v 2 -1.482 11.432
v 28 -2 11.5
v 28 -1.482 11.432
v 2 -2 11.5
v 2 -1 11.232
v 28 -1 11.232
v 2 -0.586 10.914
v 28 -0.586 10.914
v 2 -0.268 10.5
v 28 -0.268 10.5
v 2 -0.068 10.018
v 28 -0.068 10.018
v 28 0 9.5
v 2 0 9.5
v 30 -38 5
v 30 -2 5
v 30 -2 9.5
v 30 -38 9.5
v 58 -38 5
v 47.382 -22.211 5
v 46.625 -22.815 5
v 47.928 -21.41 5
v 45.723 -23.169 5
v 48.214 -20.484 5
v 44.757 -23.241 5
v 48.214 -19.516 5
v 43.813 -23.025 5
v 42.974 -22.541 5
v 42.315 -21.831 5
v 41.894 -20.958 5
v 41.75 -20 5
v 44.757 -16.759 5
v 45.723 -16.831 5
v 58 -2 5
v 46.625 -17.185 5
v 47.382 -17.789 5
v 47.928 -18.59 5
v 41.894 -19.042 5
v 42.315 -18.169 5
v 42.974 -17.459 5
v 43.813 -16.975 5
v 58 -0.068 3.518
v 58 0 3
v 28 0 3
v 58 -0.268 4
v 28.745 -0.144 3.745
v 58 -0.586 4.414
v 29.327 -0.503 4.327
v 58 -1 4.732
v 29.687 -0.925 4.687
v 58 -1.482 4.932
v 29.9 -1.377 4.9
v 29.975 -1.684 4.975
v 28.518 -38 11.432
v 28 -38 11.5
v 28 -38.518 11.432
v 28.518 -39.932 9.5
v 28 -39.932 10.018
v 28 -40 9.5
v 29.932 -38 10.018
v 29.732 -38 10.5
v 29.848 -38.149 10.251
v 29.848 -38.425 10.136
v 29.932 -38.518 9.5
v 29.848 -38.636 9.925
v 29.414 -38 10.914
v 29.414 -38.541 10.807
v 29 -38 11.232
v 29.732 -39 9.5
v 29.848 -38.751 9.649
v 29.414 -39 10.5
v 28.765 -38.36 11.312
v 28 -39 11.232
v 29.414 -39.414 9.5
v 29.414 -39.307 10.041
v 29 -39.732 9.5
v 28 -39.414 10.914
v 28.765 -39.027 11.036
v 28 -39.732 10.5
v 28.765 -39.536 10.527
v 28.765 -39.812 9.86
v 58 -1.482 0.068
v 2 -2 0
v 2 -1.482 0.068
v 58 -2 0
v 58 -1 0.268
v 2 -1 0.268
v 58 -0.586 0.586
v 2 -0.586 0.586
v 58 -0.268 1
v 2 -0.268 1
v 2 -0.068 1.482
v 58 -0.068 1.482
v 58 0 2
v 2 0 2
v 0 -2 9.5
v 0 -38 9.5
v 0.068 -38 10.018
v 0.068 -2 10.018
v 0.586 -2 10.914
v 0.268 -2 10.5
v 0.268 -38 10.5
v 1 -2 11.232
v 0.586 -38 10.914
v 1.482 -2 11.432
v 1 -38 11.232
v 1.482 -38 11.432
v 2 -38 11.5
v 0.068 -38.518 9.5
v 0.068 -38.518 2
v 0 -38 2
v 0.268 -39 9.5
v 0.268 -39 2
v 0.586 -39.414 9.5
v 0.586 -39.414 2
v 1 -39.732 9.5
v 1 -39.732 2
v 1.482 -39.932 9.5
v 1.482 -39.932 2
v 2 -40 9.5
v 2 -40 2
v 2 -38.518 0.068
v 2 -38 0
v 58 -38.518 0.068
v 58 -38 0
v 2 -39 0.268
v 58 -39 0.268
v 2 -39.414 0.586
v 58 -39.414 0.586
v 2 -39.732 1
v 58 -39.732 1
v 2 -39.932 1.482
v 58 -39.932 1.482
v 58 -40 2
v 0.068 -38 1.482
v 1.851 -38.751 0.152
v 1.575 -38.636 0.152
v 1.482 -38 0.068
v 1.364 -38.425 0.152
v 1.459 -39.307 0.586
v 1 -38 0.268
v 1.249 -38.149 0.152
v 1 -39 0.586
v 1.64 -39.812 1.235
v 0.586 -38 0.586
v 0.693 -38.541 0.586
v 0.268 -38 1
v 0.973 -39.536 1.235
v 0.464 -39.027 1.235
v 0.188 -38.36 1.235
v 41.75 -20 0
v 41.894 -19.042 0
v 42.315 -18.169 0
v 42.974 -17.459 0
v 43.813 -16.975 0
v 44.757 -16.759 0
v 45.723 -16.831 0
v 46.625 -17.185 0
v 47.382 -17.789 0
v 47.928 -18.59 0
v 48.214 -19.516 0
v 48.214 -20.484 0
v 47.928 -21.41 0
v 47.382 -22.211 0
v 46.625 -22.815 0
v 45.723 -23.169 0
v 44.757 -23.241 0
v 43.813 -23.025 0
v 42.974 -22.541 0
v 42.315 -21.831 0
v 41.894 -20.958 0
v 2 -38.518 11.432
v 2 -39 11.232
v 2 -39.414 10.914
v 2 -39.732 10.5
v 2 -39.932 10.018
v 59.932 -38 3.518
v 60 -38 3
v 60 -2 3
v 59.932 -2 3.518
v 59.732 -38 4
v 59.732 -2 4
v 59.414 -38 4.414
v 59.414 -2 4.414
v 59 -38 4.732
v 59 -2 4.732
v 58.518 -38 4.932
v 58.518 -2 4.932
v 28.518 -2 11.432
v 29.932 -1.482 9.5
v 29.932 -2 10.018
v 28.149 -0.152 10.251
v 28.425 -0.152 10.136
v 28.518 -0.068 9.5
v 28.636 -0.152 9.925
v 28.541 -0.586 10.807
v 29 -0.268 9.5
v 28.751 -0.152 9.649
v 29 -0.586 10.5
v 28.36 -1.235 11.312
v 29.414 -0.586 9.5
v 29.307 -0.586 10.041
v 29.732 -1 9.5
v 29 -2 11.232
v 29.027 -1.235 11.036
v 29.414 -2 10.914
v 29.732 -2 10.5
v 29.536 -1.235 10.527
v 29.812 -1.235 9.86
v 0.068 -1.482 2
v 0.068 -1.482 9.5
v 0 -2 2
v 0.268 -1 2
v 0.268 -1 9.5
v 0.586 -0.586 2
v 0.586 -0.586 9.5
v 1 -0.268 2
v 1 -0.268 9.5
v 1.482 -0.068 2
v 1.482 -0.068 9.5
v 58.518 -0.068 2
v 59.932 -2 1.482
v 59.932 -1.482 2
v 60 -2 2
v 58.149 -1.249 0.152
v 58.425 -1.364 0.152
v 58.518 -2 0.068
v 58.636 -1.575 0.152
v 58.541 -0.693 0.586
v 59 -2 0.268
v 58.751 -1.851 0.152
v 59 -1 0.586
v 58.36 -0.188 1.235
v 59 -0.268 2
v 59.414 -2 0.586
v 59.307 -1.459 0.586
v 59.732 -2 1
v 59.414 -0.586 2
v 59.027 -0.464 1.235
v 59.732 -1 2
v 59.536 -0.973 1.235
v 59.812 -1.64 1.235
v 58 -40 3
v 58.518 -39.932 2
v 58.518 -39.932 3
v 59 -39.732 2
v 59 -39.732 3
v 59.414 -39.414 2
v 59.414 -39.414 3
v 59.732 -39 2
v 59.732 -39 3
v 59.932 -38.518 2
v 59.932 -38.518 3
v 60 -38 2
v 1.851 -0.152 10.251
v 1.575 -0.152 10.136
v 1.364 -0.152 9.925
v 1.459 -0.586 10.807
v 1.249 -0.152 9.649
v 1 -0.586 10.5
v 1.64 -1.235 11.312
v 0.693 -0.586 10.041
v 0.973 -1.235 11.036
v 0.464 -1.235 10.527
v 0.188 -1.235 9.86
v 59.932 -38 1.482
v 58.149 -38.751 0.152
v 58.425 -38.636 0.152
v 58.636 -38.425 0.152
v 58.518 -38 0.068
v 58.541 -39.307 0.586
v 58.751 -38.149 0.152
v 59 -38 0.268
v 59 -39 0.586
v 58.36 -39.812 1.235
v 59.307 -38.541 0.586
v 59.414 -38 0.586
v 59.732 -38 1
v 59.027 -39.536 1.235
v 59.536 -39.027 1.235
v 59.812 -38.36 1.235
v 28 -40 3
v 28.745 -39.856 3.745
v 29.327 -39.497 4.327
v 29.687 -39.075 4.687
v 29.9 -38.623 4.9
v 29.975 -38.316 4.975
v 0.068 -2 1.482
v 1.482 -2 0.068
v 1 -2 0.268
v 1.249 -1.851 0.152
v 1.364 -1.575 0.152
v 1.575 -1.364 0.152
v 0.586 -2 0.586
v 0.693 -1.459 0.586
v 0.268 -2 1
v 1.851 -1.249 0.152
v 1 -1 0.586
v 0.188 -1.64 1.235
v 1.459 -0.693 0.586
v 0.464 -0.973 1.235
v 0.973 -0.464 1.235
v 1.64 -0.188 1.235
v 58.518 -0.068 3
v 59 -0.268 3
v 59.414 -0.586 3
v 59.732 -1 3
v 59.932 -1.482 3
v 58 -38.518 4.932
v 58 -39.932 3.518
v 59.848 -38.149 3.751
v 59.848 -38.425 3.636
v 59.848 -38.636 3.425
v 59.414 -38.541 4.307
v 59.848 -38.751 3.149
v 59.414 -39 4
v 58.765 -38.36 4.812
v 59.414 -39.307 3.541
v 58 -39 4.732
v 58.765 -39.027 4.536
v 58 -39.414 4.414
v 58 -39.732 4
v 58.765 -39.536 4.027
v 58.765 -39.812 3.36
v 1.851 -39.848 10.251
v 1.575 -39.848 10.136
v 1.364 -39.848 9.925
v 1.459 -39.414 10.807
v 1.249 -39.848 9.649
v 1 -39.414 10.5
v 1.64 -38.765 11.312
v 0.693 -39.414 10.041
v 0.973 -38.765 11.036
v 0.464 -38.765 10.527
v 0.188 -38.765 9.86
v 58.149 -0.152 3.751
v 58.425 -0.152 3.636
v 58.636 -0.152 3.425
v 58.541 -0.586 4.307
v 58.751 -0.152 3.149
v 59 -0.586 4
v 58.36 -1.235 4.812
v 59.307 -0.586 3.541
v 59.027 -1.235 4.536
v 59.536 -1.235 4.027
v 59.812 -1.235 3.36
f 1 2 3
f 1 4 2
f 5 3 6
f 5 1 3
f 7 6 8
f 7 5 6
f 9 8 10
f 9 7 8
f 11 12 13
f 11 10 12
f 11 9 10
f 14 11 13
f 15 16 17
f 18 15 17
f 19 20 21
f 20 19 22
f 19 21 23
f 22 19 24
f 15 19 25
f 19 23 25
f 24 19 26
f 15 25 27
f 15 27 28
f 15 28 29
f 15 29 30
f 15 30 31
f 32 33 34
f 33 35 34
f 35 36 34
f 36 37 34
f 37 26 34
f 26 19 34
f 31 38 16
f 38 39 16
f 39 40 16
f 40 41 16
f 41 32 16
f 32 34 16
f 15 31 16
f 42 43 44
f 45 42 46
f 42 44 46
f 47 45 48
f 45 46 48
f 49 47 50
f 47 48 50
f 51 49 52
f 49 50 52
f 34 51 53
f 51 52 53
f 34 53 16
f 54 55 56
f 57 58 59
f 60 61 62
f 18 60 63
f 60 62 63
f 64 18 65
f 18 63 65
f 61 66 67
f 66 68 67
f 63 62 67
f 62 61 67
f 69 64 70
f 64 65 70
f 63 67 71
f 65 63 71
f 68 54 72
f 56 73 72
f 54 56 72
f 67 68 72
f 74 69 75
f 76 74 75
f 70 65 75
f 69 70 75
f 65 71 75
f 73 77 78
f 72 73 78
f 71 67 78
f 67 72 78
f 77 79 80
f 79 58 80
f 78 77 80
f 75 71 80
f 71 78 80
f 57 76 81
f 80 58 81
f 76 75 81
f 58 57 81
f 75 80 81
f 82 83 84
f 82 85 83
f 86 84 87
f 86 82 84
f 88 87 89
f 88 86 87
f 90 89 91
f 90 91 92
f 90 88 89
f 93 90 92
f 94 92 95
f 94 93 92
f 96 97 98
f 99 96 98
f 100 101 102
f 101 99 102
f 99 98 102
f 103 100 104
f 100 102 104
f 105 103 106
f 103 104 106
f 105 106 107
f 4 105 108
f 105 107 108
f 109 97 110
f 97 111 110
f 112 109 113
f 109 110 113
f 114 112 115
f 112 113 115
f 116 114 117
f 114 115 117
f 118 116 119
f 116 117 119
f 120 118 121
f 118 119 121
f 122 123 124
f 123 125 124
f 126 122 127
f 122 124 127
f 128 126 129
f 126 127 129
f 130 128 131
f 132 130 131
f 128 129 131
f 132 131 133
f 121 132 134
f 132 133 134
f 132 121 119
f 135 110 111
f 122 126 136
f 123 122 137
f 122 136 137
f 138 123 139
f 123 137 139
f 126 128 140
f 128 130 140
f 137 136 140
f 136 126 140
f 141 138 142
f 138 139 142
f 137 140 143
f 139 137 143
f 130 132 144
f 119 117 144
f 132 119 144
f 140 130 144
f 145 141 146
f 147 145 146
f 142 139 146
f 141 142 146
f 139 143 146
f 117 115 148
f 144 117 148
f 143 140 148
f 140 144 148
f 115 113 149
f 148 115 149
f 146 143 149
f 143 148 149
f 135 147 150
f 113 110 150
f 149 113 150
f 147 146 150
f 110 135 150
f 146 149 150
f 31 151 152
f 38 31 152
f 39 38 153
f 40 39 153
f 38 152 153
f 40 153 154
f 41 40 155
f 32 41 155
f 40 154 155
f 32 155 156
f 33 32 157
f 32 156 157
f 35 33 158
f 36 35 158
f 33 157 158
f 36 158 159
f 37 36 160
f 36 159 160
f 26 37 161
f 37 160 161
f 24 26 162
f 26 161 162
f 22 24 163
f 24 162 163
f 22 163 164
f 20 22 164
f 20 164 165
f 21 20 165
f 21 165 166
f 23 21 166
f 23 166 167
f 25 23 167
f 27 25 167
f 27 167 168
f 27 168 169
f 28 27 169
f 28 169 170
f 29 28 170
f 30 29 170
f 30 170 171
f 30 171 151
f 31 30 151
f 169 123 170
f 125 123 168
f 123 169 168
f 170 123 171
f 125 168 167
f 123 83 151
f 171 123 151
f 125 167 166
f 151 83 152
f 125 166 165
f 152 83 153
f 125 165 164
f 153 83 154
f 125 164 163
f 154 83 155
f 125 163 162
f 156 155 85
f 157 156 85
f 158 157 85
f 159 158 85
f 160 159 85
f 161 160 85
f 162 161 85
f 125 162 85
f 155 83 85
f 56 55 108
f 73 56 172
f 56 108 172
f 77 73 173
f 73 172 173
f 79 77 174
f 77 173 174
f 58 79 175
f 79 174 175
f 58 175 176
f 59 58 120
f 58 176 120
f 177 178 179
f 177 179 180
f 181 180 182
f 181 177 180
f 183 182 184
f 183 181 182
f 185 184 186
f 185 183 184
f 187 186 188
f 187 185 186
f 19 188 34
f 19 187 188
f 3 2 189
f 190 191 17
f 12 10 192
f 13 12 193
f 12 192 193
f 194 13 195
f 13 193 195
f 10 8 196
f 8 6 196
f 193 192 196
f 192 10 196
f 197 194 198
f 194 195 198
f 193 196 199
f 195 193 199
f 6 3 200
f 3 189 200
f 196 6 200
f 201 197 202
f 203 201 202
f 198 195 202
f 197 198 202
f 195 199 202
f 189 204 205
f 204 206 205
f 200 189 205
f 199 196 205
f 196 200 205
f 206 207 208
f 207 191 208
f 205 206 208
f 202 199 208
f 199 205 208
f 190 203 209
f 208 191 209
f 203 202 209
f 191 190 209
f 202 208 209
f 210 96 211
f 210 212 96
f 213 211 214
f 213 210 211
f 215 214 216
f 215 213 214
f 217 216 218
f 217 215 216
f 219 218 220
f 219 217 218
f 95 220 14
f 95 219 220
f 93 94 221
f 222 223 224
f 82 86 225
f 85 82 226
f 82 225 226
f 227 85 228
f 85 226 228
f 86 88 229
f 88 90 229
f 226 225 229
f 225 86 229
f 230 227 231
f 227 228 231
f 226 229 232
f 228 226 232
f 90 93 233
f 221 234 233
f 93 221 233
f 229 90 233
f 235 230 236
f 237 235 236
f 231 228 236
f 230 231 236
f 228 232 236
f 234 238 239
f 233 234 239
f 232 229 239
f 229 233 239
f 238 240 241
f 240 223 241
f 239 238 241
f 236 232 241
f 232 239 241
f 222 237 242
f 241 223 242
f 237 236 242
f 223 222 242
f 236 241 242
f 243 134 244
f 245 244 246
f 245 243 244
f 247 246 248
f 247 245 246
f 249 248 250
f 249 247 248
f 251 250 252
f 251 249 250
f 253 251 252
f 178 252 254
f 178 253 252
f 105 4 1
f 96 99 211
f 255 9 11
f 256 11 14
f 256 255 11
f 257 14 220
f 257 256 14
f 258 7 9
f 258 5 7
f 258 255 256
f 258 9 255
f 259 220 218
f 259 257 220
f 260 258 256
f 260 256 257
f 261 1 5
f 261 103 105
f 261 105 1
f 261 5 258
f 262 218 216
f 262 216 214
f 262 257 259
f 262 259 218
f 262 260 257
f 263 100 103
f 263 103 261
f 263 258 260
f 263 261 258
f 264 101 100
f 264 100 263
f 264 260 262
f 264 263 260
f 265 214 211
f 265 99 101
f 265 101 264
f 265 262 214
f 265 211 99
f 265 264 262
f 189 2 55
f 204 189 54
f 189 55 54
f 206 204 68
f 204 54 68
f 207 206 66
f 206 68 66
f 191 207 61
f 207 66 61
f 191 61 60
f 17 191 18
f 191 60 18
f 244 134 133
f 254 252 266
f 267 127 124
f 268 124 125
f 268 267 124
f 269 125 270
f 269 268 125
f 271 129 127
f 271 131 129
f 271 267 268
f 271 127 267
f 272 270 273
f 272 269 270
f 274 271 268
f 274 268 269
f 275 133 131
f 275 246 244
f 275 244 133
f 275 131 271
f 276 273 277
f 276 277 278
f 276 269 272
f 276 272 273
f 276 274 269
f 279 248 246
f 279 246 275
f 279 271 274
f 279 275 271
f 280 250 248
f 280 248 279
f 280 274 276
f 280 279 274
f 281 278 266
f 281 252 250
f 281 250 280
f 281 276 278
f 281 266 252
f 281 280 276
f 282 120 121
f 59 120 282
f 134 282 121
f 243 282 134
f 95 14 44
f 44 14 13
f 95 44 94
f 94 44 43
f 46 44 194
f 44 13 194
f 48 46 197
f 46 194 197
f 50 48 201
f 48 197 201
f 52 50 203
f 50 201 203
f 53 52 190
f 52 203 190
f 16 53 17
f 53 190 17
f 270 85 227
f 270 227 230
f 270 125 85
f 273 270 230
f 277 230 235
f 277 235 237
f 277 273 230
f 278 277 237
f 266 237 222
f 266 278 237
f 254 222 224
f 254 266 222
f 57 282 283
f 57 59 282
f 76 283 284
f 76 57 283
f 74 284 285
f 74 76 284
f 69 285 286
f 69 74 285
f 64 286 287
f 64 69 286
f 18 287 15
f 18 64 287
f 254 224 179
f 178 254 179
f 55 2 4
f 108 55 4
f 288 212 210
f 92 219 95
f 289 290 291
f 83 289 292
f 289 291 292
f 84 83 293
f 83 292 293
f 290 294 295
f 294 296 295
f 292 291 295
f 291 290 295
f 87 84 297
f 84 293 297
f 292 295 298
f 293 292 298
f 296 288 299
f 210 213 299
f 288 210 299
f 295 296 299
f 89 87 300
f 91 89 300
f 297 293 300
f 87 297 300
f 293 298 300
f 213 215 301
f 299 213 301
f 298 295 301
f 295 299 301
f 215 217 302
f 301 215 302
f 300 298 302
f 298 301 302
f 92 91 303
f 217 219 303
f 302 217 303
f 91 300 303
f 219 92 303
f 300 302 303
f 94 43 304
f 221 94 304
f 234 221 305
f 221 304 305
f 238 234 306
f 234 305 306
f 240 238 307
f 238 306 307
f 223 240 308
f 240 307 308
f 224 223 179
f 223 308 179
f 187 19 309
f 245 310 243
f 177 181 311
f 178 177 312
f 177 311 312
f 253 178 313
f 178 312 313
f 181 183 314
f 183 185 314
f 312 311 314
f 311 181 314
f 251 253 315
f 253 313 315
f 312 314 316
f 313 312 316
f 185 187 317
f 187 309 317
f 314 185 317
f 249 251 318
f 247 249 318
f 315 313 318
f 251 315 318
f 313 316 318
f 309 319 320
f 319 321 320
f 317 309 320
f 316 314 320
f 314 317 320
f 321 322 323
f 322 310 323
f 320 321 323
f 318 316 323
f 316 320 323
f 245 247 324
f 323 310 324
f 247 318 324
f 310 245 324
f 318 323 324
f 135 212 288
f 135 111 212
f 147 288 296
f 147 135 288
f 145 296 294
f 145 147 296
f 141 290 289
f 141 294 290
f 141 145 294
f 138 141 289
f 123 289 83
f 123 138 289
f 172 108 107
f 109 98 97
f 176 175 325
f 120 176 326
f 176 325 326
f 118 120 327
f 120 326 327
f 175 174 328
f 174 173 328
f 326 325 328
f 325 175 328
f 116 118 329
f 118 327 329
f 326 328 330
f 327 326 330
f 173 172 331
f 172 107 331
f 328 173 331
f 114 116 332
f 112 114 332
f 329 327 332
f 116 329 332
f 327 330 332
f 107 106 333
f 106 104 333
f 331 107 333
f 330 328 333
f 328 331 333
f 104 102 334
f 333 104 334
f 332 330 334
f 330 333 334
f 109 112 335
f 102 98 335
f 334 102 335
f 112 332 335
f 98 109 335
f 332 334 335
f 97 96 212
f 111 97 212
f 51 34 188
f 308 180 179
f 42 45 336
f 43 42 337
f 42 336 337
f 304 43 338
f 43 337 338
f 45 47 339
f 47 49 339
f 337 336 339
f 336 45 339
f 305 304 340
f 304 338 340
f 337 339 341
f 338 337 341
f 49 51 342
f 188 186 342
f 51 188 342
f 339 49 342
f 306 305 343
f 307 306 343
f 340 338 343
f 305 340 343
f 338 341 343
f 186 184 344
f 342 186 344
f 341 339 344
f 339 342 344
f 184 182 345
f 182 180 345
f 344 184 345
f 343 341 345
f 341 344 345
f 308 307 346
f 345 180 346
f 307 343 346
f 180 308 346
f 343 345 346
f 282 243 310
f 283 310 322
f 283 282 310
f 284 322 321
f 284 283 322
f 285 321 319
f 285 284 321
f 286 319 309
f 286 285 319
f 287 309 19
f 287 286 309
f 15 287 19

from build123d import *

# Parameters (mm, degrees)
F1_DEPTH = 40
F3_D     = 6.5
F3_DEPTH = 30
F4_R     = 2


with BuildPart() as f1:
    # F0 (on Front) → F1 (new body)
    with BuildSketch(Plane.XZ):
        Polygon((0, 11.5), (0, 0), (60, 0), (60, 5), (30, 5), (30, 11.5), align=None)
    extrude(amount=F1_DEPTH)

    # F3
    with Locations(Plane.XY.offset(5)):
        with Locations((45, -20)):
            Hole(F3_D / 2, depth=F3_DEPTH)

    # F4
    f4_edges = [f1.edges().sort_by_distance(p)[0] for p in [
        (0, -20, 11.5),
        (15, -40, 11.5),
        (30, -20, 11.5),
        (15, 0, 11.5),
        (0, 0, 5.75),
        (0, -40, 5.75),
        (30, -40, 8.25),
        (30, 0, 8.25),
        (45, -40, 5),
        (60, -20, 5),
        (45, 0, 5),
        (60, -40, 2.5),
        (60, 0, 2.5),
        (30, -40, 0),
        (0, -20, 0),
        (30, 0, 0),
        (60, -20, 0),
    ]]
    fillet(f4_edges, radius=F4_R)


solid = f1.part
